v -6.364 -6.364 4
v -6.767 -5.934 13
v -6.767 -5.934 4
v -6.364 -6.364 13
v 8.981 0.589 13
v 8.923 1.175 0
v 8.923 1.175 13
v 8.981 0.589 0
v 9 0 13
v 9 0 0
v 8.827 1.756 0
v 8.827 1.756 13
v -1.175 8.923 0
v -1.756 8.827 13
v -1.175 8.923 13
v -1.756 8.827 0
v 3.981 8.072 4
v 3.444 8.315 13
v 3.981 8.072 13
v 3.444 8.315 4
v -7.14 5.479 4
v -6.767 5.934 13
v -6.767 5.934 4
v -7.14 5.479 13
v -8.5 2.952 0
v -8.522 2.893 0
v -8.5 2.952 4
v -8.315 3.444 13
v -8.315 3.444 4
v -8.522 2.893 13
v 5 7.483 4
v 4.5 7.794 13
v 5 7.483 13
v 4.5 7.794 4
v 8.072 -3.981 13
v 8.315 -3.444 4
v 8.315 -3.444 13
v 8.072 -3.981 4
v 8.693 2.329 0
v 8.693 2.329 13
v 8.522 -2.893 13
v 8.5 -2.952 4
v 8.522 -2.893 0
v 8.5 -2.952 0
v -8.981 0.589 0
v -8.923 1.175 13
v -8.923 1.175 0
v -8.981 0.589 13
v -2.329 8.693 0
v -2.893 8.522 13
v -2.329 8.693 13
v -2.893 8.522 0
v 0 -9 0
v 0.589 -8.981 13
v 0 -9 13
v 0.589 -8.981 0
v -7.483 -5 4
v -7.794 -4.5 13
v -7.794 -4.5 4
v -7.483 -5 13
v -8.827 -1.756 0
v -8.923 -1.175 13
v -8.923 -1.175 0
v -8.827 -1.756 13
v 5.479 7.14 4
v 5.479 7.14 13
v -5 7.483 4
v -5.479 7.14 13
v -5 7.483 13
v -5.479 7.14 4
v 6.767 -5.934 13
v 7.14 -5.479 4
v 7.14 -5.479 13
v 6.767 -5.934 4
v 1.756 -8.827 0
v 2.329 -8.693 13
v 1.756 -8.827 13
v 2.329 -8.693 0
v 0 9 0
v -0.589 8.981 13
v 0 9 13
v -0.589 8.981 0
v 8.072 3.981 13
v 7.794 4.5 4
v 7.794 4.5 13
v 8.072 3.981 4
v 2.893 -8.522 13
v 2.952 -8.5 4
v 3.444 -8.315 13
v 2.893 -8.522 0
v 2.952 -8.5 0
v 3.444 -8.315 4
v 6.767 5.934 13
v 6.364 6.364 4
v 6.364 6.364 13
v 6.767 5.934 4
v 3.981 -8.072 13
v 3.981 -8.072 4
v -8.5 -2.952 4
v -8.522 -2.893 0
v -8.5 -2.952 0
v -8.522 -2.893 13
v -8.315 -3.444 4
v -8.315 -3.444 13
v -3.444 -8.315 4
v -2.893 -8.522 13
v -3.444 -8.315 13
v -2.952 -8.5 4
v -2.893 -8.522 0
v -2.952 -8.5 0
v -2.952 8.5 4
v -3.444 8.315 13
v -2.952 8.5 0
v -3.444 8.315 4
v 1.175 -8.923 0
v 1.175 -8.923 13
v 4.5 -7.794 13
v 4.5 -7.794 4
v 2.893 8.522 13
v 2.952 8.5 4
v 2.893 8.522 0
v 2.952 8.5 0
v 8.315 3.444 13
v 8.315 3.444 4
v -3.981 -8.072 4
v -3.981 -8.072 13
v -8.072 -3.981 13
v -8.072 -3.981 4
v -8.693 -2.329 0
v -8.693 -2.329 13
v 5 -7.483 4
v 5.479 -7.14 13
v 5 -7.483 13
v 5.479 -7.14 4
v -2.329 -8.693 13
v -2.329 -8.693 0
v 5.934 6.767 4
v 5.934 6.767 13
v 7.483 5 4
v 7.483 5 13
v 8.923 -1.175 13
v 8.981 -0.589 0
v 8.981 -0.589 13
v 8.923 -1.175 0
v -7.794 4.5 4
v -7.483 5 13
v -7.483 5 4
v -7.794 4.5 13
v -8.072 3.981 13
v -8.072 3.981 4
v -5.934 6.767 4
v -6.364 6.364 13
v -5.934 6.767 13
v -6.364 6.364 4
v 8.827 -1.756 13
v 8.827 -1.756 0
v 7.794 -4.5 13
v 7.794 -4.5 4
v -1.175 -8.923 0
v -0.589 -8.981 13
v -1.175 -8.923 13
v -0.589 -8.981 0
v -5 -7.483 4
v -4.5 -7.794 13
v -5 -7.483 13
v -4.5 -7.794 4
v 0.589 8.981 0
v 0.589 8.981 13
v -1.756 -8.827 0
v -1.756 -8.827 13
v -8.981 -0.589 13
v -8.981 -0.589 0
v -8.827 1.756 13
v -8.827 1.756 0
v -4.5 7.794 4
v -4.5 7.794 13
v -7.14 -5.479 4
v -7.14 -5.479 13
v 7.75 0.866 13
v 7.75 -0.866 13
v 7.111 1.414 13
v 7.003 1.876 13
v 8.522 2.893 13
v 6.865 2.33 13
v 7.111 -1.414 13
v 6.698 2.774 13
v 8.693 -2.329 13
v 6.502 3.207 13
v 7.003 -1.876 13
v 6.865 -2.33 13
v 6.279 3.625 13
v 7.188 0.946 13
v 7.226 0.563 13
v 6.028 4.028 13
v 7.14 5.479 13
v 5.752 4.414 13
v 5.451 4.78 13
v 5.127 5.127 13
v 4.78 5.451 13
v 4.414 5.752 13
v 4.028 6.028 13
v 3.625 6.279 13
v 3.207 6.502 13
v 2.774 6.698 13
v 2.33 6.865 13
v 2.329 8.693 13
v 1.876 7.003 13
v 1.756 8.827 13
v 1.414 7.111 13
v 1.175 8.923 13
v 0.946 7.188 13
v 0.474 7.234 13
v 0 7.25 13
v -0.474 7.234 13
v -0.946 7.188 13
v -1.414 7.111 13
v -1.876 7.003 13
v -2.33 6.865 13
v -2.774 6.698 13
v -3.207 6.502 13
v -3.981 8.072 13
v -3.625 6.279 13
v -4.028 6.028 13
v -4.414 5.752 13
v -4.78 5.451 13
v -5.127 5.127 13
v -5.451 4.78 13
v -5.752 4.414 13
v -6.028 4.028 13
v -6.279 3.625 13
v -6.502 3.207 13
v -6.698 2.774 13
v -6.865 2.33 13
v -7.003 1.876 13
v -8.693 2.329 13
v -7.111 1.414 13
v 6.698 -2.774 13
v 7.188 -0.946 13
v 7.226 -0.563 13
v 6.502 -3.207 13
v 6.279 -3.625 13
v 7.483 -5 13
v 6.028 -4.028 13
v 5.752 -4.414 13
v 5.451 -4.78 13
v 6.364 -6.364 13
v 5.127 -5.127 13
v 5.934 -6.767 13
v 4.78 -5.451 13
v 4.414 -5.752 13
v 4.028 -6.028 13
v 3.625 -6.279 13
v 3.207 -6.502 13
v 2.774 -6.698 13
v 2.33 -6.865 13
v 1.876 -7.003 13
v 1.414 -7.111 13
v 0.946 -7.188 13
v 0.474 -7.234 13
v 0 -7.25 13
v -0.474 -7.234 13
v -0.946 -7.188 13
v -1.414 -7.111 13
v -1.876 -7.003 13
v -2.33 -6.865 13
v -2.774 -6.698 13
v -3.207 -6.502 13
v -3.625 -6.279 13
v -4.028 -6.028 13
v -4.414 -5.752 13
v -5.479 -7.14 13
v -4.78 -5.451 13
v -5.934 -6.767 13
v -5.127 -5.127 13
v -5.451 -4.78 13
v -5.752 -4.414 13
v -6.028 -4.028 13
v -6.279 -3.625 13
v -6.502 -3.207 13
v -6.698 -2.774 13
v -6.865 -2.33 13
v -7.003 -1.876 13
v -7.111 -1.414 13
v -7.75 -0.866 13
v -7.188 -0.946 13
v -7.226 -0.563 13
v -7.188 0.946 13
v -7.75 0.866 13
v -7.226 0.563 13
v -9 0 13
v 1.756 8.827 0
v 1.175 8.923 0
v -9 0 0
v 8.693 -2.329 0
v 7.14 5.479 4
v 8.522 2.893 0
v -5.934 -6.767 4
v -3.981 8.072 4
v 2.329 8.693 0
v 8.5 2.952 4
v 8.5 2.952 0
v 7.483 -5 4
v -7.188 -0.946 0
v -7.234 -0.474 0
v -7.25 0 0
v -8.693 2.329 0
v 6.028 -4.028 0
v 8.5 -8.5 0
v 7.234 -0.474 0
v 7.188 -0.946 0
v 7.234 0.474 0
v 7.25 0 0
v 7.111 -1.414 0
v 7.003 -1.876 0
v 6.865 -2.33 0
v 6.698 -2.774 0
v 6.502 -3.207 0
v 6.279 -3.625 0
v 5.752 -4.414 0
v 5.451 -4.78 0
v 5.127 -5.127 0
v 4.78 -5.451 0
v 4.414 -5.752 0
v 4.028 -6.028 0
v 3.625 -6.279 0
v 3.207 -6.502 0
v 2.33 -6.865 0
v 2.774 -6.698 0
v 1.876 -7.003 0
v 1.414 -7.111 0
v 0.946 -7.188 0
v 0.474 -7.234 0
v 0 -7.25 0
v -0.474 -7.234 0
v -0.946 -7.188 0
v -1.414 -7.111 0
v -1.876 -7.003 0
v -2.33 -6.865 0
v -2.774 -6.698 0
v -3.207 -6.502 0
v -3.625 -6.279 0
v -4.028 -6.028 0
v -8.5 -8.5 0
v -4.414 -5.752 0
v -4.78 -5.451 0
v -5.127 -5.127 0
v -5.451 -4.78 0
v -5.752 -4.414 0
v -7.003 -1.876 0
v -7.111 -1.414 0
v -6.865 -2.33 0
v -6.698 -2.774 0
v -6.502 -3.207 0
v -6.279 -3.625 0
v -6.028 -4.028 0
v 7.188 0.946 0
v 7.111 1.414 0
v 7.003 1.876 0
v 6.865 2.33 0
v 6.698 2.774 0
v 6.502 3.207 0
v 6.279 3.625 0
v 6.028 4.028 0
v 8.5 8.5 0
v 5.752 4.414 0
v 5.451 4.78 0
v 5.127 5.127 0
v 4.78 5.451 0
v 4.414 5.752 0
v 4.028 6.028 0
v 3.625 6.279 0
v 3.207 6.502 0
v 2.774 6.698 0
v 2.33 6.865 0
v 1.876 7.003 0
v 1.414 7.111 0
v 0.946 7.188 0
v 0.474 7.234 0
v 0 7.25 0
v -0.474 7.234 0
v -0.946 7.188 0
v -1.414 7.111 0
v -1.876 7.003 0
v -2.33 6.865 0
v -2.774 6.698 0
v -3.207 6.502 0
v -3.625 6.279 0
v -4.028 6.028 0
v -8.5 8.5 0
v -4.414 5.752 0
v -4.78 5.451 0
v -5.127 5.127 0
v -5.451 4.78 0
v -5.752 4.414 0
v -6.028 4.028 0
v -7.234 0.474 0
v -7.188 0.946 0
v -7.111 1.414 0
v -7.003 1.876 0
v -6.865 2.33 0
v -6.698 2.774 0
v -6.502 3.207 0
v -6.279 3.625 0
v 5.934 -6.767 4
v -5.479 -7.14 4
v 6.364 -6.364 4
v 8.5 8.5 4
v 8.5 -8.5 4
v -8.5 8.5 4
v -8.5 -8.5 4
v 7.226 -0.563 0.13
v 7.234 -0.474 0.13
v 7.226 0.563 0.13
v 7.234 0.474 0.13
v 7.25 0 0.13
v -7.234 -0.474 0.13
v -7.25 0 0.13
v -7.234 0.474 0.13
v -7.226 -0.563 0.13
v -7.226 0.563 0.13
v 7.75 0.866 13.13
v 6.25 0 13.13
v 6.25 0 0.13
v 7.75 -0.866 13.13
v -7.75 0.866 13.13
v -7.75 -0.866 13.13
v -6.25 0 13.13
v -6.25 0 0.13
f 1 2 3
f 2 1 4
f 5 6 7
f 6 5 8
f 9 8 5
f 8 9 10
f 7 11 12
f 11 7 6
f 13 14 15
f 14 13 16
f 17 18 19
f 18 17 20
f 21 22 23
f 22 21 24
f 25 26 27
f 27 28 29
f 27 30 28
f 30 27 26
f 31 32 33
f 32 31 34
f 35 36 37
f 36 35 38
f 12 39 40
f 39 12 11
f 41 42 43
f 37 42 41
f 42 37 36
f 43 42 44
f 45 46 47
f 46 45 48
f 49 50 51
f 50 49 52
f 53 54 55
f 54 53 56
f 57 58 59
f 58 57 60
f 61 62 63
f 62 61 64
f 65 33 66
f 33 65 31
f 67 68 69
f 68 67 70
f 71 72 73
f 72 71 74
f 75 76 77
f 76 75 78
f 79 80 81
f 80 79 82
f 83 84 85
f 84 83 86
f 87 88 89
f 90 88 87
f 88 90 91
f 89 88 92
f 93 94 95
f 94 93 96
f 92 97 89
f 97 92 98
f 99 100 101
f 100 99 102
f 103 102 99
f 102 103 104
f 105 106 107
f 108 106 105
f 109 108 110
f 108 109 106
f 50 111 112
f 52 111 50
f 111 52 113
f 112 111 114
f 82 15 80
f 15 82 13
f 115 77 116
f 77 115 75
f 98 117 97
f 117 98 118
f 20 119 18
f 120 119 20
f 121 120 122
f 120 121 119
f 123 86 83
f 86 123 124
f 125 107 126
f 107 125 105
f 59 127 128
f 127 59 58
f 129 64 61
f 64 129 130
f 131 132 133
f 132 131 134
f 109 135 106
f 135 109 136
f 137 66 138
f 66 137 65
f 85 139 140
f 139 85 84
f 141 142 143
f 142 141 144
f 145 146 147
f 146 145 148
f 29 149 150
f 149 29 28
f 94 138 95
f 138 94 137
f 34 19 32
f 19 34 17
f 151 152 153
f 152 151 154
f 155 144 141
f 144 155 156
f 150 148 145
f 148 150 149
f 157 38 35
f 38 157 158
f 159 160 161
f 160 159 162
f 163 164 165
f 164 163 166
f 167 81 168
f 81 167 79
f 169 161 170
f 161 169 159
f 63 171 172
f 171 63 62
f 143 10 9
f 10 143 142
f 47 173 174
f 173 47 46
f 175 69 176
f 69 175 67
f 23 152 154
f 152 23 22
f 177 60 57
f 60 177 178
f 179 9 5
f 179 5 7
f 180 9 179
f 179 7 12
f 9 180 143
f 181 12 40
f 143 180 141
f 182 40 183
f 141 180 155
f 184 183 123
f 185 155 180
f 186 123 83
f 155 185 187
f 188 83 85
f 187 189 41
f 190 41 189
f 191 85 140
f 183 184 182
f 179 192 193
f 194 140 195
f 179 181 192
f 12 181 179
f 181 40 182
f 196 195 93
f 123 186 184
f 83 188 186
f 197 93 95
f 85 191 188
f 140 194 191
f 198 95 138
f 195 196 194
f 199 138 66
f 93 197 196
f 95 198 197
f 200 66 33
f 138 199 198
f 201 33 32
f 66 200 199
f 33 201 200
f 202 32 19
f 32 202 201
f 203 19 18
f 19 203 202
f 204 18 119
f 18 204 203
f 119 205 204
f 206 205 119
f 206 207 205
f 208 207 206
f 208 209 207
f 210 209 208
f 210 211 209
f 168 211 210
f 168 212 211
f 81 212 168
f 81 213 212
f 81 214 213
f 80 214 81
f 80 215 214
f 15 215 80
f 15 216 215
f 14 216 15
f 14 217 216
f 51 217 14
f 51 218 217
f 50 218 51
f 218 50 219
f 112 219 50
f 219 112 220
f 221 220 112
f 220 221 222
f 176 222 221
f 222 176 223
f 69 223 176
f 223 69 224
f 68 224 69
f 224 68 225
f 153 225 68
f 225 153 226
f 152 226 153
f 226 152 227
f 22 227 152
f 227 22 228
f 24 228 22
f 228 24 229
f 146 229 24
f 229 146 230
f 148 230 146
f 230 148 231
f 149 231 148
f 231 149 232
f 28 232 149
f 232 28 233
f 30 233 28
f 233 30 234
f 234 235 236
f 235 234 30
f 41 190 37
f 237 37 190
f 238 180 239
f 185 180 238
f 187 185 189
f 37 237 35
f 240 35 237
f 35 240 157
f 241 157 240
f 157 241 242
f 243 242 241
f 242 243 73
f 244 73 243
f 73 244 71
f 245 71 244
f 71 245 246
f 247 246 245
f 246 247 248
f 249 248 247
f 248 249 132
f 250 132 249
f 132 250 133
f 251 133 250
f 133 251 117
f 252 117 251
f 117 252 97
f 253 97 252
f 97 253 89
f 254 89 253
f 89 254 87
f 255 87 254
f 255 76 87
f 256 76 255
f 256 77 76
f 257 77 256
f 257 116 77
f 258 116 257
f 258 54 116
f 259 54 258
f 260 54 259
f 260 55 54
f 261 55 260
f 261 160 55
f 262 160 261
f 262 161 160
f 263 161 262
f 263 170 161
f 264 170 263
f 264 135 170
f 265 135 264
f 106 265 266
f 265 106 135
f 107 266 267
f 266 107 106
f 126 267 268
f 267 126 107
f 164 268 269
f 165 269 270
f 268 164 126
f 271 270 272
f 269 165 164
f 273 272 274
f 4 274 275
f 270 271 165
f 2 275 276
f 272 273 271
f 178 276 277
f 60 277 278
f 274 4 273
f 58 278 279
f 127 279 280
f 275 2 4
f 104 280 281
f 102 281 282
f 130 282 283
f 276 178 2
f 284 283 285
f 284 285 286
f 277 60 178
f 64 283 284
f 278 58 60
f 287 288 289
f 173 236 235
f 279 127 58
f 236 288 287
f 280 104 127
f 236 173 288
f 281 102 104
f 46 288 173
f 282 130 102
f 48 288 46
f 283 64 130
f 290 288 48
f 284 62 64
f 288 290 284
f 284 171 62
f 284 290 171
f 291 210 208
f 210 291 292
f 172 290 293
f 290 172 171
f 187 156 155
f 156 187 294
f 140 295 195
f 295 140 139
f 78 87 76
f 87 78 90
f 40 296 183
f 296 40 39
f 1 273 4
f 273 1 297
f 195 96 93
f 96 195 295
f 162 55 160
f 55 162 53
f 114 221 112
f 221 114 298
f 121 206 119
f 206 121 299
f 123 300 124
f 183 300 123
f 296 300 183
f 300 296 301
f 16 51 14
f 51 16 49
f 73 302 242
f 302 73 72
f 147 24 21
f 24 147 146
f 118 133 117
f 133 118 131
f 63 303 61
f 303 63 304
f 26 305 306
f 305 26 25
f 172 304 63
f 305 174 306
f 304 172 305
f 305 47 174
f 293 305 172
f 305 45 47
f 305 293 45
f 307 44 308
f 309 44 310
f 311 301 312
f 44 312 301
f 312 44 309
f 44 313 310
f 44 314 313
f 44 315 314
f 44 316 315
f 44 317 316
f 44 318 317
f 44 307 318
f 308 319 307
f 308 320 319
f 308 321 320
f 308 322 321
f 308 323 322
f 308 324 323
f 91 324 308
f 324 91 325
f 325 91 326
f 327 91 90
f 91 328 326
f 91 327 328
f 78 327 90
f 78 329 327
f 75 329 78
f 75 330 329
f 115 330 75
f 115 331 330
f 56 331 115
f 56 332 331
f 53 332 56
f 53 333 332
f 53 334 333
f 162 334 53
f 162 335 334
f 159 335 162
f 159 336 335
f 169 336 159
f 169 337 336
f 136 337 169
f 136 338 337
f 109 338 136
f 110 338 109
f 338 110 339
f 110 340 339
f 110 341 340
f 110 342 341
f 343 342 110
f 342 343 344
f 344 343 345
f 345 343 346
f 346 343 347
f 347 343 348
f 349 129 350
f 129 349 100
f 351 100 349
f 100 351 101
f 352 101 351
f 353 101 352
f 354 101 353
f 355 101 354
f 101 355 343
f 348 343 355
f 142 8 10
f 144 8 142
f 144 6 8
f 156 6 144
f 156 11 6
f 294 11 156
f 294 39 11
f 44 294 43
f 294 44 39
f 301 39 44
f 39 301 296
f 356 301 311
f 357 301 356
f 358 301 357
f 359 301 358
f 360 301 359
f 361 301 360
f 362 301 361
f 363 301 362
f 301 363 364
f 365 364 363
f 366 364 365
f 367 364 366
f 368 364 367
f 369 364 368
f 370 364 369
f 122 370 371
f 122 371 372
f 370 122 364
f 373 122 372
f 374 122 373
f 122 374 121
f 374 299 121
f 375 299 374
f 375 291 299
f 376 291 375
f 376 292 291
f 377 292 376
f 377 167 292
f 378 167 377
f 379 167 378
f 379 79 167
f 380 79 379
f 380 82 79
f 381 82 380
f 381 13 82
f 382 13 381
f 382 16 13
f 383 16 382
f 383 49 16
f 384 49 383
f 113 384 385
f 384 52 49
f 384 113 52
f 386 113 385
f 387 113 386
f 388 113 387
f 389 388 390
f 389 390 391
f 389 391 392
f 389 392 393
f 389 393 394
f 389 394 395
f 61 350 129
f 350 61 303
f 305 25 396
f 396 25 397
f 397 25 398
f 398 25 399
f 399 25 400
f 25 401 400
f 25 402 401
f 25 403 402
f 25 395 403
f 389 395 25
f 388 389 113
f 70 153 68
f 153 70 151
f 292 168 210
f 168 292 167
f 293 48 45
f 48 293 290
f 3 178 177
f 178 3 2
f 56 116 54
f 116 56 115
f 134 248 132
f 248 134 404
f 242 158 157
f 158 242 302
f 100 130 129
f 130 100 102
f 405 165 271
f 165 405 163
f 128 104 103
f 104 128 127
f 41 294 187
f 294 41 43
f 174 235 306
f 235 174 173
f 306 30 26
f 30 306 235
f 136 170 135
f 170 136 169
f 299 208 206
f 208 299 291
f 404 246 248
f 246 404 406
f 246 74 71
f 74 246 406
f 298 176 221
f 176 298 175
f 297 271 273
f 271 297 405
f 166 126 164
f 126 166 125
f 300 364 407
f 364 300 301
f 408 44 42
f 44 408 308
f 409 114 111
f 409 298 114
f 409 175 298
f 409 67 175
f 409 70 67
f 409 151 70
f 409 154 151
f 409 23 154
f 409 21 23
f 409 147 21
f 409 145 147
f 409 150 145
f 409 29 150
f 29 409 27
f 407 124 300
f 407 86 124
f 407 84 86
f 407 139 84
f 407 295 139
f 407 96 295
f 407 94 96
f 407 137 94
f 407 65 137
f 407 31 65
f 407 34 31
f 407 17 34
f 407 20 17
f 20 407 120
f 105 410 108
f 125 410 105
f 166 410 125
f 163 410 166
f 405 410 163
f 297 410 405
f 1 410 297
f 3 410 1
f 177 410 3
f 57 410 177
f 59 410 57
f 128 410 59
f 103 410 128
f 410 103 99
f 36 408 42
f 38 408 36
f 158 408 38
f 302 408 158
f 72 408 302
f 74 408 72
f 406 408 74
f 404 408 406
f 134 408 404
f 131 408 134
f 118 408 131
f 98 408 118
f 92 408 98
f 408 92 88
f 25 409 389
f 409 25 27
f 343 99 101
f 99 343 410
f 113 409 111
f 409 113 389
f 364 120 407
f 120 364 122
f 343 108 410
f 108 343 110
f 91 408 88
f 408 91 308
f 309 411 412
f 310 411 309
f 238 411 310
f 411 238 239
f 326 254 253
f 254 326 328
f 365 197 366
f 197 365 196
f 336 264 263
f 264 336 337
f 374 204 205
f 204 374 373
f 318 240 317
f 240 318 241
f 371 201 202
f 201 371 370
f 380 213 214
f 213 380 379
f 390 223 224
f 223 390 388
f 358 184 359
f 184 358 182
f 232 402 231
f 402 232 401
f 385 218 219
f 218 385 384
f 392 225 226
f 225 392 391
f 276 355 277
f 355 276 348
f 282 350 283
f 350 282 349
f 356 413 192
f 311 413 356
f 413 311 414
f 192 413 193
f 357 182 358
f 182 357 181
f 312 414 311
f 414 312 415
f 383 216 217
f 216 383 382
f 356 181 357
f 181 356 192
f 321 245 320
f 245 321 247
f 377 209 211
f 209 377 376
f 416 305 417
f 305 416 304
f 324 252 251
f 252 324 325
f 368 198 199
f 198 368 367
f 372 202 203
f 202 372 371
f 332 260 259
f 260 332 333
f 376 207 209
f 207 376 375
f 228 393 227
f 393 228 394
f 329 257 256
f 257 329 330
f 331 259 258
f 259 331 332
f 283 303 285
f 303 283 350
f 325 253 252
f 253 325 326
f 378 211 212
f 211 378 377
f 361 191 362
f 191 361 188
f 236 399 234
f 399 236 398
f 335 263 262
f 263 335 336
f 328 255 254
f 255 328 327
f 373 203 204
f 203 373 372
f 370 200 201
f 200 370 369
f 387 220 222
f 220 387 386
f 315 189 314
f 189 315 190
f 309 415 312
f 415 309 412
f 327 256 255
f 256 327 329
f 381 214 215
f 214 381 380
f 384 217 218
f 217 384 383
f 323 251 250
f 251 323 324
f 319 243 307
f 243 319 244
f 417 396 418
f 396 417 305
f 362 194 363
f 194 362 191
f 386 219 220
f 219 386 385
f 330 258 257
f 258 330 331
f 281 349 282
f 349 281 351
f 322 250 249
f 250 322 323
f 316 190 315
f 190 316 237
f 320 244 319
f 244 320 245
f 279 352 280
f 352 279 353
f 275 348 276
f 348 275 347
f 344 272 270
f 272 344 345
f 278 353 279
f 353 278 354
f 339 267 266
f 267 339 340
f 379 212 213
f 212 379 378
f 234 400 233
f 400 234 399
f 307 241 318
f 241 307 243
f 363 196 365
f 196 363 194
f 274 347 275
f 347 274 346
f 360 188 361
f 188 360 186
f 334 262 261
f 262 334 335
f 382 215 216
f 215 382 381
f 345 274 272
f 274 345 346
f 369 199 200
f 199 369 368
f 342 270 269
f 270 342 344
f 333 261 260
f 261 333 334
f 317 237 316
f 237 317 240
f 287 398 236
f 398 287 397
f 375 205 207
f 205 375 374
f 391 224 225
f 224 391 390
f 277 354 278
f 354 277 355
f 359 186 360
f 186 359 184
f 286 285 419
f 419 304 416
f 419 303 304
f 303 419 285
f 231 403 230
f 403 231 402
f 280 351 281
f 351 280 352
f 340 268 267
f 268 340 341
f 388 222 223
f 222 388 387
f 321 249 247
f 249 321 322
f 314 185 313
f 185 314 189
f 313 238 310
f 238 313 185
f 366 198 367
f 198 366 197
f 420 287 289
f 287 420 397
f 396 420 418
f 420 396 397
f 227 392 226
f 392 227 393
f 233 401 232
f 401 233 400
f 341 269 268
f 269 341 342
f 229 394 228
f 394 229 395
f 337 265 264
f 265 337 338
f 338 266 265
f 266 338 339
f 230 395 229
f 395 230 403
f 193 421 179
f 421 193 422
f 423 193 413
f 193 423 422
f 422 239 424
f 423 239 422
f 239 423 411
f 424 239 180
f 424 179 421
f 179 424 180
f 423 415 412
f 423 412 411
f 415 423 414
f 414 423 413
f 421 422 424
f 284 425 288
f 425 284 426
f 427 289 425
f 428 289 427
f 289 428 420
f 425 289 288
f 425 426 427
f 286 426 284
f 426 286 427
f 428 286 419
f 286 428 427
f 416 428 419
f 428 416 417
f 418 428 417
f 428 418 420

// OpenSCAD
$fn=96;

// The switch top collar leaves nothing to grip when tightening a nut on the barrel threads
// If we cut a little notch on opposite sides (12 oclock and 6 oclock) this socket wrench
// will slip over it and make tightening easier
 
notch_wrench();

module notch_wrench() {
    nut_d=13;
    od=18;
    id=14.5;
    notch=1;
    difference() {
        union() {
          cylinder(d=od, h=nut_d);
          translate([0,0,2]) cube([nut_d+4,nut_d+4,4], center=true);
        }
        translate([0,0,-0.01]) cylinder(d=id, h=nut_d*1.1);
    }
    #translate([id/2,0,nut_d*0.51]) rotate([0,180,0]) cylinder(r=notch, h=nut_d, center=true, $fn=3);
    #translate([-id/2,0,nut_d*0.51]) rotate([0,0,0]) cylinder(r=notch, h=nut_d, center=true, $fn=3);
}
